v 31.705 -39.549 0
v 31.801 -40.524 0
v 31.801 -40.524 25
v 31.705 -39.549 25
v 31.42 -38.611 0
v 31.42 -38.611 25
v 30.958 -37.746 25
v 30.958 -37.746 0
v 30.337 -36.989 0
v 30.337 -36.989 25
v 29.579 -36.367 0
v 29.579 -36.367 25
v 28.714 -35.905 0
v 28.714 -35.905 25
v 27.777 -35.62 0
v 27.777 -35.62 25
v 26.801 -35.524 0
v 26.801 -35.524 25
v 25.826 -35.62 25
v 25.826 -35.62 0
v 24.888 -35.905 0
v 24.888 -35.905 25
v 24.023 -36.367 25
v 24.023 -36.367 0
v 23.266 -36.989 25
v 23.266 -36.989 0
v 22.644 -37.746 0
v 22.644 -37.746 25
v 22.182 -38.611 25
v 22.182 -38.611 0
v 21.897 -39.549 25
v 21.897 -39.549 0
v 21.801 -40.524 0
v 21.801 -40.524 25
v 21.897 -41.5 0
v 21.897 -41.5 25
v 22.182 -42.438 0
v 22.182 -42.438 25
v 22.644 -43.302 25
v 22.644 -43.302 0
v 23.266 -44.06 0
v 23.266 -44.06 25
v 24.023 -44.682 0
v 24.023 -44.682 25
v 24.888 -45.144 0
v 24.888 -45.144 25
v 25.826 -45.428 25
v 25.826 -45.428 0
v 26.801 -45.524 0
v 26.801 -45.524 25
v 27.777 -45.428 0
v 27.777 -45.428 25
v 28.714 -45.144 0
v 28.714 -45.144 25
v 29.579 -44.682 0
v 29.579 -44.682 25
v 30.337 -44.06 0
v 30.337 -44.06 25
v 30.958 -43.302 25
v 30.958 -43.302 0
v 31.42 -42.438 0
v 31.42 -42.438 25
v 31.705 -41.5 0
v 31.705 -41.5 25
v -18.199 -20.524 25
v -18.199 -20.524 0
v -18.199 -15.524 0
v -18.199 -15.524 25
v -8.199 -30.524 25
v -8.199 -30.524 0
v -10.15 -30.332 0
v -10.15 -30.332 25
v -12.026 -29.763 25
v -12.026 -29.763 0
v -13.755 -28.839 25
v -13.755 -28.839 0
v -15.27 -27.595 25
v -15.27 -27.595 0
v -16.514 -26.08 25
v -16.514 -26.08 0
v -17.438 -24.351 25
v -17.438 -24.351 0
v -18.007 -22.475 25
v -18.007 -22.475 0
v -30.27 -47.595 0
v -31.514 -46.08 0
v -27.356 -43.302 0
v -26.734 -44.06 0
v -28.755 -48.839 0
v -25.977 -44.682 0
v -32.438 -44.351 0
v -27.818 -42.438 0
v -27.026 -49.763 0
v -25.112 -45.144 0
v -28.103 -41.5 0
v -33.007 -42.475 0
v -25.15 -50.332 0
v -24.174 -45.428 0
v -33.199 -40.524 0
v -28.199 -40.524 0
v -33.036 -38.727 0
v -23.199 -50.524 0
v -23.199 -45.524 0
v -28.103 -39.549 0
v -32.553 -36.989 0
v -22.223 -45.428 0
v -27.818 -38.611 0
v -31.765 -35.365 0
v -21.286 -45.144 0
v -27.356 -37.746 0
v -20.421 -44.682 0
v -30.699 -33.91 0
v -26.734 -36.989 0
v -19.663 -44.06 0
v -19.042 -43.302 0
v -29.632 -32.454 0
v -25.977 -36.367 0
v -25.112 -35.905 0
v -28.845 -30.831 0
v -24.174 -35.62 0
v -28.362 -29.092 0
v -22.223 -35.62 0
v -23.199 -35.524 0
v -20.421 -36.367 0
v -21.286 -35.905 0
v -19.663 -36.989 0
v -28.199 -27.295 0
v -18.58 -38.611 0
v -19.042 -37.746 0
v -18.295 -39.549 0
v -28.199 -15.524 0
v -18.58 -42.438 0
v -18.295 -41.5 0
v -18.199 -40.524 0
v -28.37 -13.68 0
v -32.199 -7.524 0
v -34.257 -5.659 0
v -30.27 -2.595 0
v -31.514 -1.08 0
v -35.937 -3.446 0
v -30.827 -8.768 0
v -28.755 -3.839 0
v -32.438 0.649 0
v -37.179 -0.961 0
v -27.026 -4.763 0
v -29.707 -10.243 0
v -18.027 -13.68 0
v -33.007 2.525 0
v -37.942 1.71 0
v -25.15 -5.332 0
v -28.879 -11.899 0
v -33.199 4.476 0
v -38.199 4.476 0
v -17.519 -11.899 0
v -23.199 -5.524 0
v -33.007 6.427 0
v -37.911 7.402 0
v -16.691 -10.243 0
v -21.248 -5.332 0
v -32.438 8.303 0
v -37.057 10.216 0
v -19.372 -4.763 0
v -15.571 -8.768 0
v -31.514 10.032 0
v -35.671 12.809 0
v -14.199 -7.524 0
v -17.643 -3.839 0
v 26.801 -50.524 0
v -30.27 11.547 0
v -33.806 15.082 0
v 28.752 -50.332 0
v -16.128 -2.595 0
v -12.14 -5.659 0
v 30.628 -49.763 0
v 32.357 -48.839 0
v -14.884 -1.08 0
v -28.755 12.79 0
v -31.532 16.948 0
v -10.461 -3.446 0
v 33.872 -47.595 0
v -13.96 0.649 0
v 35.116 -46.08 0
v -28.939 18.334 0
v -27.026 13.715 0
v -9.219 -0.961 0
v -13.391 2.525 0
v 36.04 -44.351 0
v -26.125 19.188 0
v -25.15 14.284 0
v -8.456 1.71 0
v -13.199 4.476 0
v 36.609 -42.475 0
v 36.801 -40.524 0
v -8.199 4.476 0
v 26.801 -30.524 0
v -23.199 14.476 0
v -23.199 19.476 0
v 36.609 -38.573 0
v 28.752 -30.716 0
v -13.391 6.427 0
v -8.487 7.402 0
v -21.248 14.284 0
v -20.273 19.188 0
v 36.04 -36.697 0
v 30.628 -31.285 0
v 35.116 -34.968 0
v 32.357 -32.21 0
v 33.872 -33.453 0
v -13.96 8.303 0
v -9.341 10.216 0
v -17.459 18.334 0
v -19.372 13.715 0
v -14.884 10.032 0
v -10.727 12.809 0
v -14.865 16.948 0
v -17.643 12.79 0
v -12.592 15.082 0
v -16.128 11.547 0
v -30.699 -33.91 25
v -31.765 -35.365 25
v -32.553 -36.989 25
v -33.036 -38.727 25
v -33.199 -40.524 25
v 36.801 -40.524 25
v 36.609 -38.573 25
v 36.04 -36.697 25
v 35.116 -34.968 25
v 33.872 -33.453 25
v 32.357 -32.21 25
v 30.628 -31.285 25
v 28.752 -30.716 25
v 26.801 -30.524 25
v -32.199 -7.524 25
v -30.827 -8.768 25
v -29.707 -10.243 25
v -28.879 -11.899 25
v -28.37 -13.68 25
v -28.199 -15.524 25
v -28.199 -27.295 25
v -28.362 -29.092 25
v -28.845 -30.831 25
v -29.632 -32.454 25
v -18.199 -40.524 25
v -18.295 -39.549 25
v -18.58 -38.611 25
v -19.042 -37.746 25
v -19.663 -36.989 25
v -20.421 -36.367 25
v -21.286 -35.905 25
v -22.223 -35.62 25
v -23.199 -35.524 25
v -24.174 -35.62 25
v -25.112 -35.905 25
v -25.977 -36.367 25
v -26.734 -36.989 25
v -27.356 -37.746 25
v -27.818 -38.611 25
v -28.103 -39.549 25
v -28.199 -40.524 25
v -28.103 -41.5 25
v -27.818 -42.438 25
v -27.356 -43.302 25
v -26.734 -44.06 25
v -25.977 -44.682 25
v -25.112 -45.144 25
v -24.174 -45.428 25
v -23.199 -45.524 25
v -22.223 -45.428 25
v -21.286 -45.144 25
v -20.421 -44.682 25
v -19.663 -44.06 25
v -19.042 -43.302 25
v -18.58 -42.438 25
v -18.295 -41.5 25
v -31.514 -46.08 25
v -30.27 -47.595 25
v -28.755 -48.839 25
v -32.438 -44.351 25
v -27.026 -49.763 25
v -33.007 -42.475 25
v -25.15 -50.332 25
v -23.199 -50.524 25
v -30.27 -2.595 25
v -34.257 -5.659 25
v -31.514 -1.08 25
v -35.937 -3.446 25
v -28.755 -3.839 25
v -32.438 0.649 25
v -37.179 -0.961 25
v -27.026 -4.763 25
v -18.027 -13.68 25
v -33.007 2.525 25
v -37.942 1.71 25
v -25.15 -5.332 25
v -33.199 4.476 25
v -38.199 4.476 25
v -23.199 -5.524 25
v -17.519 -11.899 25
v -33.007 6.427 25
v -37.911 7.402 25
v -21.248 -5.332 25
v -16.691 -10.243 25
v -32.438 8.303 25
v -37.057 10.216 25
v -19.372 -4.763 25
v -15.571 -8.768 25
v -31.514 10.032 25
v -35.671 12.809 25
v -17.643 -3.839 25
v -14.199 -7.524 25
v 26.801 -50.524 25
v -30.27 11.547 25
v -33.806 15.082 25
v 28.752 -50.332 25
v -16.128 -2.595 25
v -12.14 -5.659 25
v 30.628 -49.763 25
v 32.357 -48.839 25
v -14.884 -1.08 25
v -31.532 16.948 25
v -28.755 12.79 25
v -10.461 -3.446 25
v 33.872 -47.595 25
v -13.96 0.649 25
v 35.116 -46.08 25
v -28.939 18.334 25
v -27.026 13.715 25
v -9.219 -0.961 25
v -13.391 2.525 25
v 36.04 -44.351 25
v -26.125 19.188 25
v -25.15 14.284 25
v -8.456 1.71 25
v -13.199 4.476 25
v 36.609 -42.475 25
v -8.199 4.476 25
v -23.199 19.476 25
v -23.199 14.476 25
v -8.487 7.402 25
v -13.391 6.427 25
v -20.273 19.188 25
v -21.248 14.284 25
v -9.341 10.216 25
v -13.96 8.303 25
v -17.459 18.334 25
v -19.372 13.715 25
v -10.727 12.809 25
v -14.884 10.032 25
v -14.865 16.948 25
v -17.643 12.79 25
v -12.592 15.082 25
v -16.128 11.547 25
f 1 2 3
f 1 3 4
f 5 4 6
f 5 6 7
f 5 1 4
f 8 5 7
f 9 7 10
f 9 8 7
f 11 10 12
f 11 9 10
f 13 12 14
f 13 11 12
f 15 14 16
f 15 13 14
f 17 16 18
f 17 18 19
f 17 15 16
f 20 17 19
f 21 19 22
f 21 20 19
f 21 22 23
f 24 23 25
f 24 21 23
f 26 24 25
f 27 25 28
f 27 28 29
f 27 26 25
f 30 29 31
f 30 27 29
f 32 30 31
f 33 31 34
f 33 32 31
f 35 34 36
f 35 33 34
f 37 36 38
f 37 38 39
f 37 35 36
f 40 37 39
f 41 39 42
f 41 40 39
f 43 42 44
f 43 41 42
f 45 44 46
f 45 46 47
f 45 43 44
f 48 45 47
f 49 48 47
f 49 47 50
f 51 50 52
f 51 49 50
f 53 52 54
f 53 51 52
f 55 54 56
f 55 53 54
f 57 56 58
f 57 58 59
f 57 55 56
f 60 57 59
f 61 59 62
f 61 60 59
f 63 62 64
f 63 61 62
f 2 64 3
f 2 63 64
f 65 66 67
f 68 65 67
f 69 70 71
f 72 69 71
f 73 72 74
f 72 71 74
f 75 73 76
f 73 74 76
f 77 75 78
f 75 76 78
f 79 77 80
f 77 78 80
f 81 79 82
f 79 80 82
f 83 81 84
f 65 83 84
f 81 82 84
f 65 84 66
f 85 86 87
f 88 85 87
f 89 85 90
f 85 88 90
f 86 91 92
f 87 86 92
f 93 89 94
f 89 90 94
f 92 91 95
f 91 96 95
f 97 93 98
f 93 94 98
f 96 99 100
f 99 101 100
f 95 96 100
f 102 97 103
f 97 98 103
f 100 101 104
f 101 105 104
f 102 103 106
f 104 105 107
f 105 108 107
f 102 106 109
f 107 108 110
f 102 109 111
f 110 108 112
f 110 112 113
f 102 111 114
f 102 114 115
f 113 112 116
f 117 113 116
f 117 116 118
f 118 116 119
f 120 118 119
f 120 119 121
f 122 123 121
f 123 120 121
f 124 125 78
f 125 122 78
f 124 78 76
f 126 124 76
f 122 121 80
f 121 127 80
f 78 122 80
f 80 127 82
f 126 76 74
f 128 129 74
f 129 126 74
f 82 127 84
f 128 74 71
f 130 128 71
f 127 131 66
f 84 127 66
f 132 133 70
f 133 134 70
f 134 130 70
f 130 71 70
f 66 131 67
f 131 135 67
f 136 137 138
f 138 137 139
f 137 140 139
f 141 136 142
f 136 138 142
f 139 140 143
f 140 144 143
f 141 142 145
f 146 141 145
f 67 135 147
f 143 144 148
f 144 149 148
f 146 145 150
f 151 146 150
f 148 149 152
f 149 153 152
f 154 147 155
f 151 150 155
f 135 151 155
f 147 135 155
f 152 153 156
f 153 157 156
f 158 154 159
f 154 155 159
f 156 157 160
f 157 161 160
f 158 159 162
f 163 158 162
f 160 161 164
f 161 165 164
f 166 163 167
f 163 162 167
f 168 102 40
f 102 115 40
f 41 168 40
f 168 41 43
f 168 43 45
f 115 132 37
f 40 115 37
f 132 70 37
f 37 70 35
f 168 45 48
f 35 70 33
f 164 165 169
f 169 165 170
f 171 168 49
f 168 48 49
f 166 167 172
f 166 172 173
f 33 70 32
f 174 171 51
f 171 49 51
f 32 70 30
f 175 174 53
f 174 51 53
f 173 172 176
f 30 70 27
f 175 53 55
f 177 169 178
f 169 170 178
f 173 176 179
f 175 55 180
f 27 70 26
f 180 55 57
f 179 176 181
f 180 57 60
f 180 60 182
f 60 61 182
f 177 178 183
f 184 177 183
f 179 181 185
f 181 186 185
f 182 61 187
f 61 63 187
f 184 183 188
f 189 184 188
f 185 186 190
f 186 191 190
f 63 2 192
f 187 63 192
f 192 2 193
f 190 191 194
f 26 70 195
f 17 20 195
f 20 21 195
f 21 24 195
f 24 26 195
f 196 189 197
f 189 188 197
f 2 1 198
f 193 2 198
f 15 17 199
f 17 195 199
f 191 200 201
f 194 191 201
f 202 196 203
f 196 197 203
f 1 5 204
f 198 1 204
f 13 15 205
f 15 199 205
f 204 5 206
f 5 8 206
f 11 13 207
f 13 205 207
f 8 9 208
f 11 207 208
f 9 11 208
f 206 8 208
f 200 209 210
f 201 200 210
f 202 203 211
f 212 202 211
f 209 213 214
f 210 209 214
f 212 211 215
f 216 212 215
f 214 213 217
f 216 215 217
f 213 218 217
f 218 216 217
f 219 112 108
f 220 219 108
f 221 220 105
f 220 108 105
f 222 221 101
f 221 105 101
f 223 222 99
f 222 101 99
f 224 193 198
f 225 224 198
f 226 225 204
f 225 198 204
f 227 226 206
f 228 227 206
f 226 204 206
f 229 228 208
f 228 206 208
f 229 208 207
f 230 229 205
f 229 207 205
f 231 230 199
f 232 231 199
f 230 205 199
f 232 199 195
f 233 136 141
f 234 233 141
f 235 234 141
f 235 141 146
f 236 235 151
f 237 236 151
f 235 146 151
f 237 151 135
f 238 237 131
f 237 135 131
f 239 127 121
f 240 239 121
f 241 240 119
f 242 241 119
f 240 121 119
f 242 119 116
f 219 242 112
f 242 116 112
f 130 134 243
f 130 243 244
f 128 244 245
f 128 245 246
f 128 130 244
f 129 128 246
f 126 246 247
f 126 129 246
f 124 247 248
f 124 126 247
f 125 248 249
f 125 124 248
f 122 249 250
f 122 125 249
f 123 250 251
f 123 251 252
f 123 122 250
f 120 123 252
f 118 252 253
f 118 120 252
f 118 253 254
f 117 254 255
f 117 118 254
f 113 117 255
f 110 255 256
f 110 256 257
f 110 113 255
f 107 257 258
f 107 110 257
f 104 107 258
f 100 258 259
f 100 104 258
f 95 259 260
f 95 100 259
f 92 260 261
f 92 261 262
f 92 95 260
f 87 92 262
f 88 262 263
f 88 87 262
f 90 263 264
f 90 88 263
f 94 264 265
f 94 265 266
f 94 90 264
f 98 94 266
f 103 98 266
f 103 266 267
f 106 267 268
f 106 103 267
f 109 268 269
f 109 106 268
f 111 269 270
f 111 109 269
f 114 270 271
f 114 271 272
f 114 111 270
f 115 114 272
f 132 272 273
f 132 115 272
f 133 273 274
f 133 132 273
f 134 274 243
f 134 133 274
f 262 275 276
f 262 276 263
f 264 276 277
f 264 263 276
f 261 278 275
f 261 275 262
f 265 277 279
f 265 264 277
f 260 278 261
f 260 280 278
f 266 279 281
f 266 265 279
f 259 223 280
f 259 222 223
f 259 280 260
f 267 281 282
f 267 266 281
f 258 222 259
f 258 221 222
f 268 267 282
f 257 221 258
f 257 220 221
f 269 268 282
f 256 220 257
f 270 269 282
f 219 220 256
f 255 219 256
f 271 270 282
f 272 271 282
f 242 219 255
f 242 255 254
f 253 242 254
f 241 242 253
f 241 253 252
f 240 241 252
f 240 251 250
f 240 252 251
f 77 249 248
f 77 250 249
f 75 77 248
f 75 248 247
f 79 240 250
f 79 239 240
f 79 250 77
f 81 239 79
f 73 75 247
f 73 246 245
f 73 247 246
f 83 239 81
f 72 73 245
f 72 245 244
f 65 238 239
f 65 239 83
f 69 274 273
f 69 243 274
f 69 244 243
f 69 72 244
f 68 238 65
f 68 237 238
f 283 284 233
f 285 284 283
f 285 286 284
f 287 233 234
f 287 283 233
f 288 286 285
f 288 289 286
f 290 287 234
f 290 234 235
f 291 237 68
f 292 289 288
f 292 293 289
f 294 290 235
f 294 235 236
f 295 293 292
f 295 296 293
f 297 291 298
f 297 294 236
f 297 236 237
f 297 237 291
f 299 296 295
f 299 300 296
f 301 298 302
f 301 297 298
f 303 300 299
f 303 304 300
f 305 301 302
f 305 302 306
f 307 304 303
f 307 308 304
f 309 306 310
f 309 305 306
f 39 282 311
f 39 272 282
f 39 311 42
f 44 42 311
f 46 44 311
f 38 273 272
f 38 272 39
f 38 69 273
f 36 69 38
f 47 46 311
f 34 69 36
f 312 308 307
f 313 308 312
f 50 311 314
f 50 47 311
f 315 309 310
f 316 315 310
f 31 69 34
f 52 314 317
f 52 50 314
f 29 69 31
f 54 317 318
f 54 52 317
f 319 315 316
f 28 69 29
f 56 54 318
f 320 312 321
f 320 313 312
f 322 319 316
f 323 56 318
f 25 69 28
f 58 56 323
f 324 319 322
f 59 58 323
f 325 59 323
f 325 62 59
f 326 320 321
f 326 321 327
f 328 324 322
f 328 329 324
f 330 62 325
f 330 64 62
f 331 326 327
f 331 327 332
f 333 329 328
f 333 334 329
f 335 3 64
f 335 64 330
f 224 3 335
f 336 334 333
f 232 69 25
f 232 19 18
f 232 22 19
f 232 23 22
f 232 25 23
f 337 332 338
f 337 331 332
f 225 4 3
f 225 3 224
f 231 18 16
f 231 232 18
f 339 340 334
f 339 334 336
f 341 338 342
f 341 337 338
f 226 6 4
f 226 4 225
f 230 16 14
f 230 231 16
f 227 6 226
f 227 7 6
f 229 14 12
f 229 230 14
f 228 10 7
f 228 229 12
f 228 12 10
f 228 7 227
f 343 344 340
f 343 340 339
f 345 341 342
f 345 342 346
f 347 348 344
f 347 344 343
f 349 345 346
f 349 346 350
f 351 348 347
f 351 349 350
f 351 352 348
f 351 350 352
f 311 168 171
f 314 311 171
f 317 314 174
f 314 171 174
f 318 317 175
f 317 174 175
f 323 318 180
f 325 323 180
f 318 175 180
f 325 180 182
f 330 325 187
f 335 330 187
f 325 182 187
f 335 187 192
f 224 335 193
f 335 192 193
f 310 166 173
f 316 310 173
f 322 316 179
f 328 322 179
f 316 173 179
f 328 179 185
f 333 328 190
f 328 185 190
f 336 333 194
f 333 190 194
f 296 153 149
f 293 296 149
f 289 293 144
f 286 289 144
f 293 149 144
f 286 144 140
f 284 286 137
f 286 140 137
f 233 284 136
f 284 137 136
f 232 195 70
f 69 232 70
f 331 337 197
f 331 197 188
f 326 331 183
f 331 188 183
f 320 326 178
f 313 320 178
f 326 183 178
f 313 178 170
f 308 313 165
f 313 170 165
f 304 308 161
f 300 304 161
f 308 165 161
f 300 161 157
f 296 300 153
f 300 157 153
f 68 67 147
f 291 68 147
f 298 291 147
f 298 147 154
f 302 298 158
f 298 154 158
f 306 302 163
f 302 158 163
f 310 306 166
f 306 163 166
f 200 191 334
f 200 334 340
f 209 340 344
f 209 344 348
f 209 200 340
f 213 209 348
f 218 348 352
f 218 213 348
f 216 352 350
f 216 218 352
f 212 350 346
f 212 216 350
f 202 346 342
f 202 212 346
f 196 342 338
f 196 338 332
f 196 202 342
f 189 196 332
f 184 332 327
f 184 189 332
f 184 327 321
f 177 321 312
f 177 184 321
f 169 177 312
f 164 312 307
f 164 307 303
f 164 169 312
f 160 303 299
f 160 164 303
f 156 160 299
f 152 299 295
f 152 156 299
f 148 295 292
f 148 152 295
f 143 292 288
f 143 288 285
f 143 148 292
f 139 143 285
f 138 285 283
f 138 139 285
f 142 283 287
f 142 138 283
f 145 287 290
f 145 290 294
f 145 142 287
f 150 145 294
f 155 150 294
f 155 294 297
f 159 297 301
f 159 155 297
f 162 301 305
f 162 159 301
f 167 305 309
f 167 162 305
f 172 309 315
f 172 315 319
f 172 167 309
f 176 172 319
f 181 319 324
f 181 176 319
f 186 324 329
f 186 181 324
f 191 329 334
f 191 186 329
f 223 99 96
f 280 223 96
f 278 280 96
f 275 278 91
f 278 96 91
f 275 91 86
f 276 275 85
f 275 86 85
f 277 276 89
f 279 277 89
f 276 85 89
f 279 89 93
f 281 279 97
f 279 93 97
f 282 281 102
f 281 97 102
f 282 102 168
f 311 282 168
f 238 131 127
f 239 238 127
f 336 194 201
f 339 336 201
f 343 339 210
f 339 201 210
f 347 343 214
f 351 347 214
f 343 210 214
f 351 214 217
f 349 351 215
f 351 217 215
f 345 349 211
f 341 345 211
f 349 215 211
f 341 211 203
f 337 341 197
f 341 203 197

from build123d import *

# Parameters (mm, degrees)
F0_R     = 5
F0_R_2   = 10
F1_DEPTH = 25


with BuildPart() as f1:
    # F0 (on Top) → F1 (new body)
    with BuildSketch(Plane.XY):
        with BuildLine():
            ThreePointArc((-33.198925, -40.524198), (-30.269993, -47.595265), (-23.198925, -50.524198))
            Line((-23.198925, -50.524198), (26.801075, -50.524198))
            ThreePointArc((26.801075, -50.524198), (33.872142, -47.595265), (36.801075, -40.524198))
            ThreePointArc((36.801075, -40.524198), (33.872142, -33.45313), (26.801075, -30.524198))
            Line((26.801075, -30.524198), (-8.198925, -30.524198))
            ThreePointArc((-8.198925, -30.524198), (-15.269993, -27.595265), (-18.198925, -20.524198))
            Line((-18.198925, -20.524198), (-18.198925, -19.158835))
            Line((-18.198925, -19.158835), (-18.198925, -15.524198))
            ThreePointArc((-18.198925, -15.524198), (-17.143197, -11.052062), (-14.198925, -7.524198))
            ThreePointArc((-14.198925, -7.524198), (-9.782518, -2.232401), (-8.198925, 4.475802))
            ThreePointArc((-8.198925, 4.475802), (-12.592324, 15.082404), (-23.198925, 19.475802))
            ThreePointArc((-23.198925, 19.475802), (-33.805527, 15.082404), (-38.198925, 4.475802))
            ThreePointArc((-38.198925, 4.475802), (-36.615333, -2.232401), (-32.198925, -7.524198))
            ThreePointArc((-32.198925, -7.524198), (-29.254653, -11.052062), (-28.198925, -15.524198))
            Line((-28.198925, -15.524198), (-28.198925, -19.158835))
            Line((-28.198925, -19.158835), (-28.198925, -27.295441))
            ThreePointArc((-28.198925, -27.295441), (-28.844782, -30.830975), (-30.698925, -33.909819))
            ThreePointArc((-30.698925, -33.909819), (-32.553069, -36.988664), (-33.198925, -40.524198))
        make_face()
        with Locations((-23.198925, -40.524198)):
            Circle(F0_R, mode=Mode.SUBTRACT)
        with Locations((26.801075, -40.524198)):
            Circle(F0_R, mode=Mode.SUBTRACT)
        with Locations((-23.198925, 4.475802)):
            Circle(F0_R_2, mode=Mode.SUBTRACT)
    extrude(amount=F1_DEPTH)


solid = f1.part
